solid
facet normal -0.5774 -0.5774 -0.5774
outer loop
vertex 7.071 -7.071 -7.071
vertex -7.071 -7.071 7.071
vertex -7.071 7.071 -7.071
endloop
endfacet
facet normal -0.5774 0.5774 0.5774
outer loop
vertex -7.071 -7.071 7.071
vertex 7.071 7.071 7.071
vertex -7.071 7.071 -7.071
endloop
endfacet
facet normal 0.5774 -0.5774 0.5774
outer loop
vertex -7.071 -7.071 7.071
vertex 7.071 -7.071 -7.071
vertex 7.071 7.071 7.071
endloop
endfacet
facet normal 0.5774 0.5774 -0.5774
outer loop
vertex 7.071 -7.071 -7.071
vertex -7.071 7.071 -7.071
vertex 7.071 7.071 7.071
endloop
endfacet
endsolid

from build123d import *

# Parameters (mm, degrees)
CIRPATTERN2_2_ANGLE   = 180
CIRPATTERN2_2_5_ANGLE = 180


with BuildPart() as body_1:
    # Sketch12 → Surface-Plane4: a flat surface bounded by the sketch
    with BuildSketch(Plane(origin=(-2.357022604, -2.357022604, -2.357022604), x_dir=(0.4082482904638632, 0.4082482904638626, -0.8164965809277261), z_dir=(0.5773502691896264, 0.5773502691896254, 0.5773502691896256)), mode=Mode.PRIVATE) as surface_plane4_1_region:
        Polygon((-11.547005384, 0), (5.773502692, -10), (5.773502692, 10), align=None)
    surface_plane4_1 = surface_plane4_1_region.sketch.faces()[0]
    # CirPattern2: a copy of that surface (a pattern of surface bodies)
    cirpattern2_2 = surface_plane4_1.rotate(Axis((0, 0, 0), (0, 1, 0)), CIRPATTERN2_2_ANGLE)
    # Sketch11 → Surface-Plane3: a flat surface bounded by the sketch
    with BuildSketch(Plane(origin=(2.357022604, 2.357022604, -2.357022604), x_dir=(0.40824829046386335, 0.4082482904638629, 0.8164965809277259), z_dir=(-0.577350269189626, -0.5773502691896255, 0.577350269189626)), mode=Mode.PRIVATE) as surface_plane3_3_region:
        Polygon((-5.773502692, -10), (11.547005384, 0), (-5.773502692, 10), align=None)
    surface_plane3_3 = surface_plane3_3_region.sketch.faces()[0]
    # Sketch11 → Surface-Plane3: a flat surface bounded by the sketch
    with BuildSketch(Plane(origin=(2.357022604, 2.357022604, -2.357022604), x_dir=(0.40824829046386335, 0.4082482904638629, 0.8164965809277259), z_dir=(-0.577350269189626, -0.5773502691896255, 0.577350269189626)), mode=Mode.PRIVATE) as surface_plane3_4_region:
        Polygon((-5.773502692, -10), (11.547005384, 0), (-5.773502692, 10), align=None)
    surface_plane3_4 = surface_plane3_4_region.sketch.faces()[0]
    # CirPattern2 2: a copy of that surface (a pattern of surface bodies)
    cirpattern2_2_5 = surface_plane3_4.rotate(Axis((0, 0, 0), (0, 1, 0)), CIRPATTERN2_2_5_ANGLE)
    # Sketch12 → Surface-Plane4: a flat surface bounded by the sketch
    with BuildSketch(Plane(origin=(-2.357022604, -2.357022604, -2.357022604), x_dir=(0.4082482904638632, 0.4082482904638626, -0.8164965809277261), z_dir=(0.5773502691896264, 0.5773502691896254, 0.5773502691896256)), mode=Mode.PRIVATE) as surface_plane4_6_region:
        Polygon((-11.547005384, 0), (5.773502692, -10), (5.773502692, 10), align=None)
    surface_plane4_6 = surface_plane4_6_region.sketch.faces()[0]
    # Surface-Knit2: the surfaces knitted into a closed skin and filled: a solid
    add(Solid(Shell(Face.sew_faces(cirpattern2_2.faces() + surface_plane3_3.faces() + cirpattern2_2_5.faces() + surface_plane4_6.faces())[0])))


solid = body_1.part
